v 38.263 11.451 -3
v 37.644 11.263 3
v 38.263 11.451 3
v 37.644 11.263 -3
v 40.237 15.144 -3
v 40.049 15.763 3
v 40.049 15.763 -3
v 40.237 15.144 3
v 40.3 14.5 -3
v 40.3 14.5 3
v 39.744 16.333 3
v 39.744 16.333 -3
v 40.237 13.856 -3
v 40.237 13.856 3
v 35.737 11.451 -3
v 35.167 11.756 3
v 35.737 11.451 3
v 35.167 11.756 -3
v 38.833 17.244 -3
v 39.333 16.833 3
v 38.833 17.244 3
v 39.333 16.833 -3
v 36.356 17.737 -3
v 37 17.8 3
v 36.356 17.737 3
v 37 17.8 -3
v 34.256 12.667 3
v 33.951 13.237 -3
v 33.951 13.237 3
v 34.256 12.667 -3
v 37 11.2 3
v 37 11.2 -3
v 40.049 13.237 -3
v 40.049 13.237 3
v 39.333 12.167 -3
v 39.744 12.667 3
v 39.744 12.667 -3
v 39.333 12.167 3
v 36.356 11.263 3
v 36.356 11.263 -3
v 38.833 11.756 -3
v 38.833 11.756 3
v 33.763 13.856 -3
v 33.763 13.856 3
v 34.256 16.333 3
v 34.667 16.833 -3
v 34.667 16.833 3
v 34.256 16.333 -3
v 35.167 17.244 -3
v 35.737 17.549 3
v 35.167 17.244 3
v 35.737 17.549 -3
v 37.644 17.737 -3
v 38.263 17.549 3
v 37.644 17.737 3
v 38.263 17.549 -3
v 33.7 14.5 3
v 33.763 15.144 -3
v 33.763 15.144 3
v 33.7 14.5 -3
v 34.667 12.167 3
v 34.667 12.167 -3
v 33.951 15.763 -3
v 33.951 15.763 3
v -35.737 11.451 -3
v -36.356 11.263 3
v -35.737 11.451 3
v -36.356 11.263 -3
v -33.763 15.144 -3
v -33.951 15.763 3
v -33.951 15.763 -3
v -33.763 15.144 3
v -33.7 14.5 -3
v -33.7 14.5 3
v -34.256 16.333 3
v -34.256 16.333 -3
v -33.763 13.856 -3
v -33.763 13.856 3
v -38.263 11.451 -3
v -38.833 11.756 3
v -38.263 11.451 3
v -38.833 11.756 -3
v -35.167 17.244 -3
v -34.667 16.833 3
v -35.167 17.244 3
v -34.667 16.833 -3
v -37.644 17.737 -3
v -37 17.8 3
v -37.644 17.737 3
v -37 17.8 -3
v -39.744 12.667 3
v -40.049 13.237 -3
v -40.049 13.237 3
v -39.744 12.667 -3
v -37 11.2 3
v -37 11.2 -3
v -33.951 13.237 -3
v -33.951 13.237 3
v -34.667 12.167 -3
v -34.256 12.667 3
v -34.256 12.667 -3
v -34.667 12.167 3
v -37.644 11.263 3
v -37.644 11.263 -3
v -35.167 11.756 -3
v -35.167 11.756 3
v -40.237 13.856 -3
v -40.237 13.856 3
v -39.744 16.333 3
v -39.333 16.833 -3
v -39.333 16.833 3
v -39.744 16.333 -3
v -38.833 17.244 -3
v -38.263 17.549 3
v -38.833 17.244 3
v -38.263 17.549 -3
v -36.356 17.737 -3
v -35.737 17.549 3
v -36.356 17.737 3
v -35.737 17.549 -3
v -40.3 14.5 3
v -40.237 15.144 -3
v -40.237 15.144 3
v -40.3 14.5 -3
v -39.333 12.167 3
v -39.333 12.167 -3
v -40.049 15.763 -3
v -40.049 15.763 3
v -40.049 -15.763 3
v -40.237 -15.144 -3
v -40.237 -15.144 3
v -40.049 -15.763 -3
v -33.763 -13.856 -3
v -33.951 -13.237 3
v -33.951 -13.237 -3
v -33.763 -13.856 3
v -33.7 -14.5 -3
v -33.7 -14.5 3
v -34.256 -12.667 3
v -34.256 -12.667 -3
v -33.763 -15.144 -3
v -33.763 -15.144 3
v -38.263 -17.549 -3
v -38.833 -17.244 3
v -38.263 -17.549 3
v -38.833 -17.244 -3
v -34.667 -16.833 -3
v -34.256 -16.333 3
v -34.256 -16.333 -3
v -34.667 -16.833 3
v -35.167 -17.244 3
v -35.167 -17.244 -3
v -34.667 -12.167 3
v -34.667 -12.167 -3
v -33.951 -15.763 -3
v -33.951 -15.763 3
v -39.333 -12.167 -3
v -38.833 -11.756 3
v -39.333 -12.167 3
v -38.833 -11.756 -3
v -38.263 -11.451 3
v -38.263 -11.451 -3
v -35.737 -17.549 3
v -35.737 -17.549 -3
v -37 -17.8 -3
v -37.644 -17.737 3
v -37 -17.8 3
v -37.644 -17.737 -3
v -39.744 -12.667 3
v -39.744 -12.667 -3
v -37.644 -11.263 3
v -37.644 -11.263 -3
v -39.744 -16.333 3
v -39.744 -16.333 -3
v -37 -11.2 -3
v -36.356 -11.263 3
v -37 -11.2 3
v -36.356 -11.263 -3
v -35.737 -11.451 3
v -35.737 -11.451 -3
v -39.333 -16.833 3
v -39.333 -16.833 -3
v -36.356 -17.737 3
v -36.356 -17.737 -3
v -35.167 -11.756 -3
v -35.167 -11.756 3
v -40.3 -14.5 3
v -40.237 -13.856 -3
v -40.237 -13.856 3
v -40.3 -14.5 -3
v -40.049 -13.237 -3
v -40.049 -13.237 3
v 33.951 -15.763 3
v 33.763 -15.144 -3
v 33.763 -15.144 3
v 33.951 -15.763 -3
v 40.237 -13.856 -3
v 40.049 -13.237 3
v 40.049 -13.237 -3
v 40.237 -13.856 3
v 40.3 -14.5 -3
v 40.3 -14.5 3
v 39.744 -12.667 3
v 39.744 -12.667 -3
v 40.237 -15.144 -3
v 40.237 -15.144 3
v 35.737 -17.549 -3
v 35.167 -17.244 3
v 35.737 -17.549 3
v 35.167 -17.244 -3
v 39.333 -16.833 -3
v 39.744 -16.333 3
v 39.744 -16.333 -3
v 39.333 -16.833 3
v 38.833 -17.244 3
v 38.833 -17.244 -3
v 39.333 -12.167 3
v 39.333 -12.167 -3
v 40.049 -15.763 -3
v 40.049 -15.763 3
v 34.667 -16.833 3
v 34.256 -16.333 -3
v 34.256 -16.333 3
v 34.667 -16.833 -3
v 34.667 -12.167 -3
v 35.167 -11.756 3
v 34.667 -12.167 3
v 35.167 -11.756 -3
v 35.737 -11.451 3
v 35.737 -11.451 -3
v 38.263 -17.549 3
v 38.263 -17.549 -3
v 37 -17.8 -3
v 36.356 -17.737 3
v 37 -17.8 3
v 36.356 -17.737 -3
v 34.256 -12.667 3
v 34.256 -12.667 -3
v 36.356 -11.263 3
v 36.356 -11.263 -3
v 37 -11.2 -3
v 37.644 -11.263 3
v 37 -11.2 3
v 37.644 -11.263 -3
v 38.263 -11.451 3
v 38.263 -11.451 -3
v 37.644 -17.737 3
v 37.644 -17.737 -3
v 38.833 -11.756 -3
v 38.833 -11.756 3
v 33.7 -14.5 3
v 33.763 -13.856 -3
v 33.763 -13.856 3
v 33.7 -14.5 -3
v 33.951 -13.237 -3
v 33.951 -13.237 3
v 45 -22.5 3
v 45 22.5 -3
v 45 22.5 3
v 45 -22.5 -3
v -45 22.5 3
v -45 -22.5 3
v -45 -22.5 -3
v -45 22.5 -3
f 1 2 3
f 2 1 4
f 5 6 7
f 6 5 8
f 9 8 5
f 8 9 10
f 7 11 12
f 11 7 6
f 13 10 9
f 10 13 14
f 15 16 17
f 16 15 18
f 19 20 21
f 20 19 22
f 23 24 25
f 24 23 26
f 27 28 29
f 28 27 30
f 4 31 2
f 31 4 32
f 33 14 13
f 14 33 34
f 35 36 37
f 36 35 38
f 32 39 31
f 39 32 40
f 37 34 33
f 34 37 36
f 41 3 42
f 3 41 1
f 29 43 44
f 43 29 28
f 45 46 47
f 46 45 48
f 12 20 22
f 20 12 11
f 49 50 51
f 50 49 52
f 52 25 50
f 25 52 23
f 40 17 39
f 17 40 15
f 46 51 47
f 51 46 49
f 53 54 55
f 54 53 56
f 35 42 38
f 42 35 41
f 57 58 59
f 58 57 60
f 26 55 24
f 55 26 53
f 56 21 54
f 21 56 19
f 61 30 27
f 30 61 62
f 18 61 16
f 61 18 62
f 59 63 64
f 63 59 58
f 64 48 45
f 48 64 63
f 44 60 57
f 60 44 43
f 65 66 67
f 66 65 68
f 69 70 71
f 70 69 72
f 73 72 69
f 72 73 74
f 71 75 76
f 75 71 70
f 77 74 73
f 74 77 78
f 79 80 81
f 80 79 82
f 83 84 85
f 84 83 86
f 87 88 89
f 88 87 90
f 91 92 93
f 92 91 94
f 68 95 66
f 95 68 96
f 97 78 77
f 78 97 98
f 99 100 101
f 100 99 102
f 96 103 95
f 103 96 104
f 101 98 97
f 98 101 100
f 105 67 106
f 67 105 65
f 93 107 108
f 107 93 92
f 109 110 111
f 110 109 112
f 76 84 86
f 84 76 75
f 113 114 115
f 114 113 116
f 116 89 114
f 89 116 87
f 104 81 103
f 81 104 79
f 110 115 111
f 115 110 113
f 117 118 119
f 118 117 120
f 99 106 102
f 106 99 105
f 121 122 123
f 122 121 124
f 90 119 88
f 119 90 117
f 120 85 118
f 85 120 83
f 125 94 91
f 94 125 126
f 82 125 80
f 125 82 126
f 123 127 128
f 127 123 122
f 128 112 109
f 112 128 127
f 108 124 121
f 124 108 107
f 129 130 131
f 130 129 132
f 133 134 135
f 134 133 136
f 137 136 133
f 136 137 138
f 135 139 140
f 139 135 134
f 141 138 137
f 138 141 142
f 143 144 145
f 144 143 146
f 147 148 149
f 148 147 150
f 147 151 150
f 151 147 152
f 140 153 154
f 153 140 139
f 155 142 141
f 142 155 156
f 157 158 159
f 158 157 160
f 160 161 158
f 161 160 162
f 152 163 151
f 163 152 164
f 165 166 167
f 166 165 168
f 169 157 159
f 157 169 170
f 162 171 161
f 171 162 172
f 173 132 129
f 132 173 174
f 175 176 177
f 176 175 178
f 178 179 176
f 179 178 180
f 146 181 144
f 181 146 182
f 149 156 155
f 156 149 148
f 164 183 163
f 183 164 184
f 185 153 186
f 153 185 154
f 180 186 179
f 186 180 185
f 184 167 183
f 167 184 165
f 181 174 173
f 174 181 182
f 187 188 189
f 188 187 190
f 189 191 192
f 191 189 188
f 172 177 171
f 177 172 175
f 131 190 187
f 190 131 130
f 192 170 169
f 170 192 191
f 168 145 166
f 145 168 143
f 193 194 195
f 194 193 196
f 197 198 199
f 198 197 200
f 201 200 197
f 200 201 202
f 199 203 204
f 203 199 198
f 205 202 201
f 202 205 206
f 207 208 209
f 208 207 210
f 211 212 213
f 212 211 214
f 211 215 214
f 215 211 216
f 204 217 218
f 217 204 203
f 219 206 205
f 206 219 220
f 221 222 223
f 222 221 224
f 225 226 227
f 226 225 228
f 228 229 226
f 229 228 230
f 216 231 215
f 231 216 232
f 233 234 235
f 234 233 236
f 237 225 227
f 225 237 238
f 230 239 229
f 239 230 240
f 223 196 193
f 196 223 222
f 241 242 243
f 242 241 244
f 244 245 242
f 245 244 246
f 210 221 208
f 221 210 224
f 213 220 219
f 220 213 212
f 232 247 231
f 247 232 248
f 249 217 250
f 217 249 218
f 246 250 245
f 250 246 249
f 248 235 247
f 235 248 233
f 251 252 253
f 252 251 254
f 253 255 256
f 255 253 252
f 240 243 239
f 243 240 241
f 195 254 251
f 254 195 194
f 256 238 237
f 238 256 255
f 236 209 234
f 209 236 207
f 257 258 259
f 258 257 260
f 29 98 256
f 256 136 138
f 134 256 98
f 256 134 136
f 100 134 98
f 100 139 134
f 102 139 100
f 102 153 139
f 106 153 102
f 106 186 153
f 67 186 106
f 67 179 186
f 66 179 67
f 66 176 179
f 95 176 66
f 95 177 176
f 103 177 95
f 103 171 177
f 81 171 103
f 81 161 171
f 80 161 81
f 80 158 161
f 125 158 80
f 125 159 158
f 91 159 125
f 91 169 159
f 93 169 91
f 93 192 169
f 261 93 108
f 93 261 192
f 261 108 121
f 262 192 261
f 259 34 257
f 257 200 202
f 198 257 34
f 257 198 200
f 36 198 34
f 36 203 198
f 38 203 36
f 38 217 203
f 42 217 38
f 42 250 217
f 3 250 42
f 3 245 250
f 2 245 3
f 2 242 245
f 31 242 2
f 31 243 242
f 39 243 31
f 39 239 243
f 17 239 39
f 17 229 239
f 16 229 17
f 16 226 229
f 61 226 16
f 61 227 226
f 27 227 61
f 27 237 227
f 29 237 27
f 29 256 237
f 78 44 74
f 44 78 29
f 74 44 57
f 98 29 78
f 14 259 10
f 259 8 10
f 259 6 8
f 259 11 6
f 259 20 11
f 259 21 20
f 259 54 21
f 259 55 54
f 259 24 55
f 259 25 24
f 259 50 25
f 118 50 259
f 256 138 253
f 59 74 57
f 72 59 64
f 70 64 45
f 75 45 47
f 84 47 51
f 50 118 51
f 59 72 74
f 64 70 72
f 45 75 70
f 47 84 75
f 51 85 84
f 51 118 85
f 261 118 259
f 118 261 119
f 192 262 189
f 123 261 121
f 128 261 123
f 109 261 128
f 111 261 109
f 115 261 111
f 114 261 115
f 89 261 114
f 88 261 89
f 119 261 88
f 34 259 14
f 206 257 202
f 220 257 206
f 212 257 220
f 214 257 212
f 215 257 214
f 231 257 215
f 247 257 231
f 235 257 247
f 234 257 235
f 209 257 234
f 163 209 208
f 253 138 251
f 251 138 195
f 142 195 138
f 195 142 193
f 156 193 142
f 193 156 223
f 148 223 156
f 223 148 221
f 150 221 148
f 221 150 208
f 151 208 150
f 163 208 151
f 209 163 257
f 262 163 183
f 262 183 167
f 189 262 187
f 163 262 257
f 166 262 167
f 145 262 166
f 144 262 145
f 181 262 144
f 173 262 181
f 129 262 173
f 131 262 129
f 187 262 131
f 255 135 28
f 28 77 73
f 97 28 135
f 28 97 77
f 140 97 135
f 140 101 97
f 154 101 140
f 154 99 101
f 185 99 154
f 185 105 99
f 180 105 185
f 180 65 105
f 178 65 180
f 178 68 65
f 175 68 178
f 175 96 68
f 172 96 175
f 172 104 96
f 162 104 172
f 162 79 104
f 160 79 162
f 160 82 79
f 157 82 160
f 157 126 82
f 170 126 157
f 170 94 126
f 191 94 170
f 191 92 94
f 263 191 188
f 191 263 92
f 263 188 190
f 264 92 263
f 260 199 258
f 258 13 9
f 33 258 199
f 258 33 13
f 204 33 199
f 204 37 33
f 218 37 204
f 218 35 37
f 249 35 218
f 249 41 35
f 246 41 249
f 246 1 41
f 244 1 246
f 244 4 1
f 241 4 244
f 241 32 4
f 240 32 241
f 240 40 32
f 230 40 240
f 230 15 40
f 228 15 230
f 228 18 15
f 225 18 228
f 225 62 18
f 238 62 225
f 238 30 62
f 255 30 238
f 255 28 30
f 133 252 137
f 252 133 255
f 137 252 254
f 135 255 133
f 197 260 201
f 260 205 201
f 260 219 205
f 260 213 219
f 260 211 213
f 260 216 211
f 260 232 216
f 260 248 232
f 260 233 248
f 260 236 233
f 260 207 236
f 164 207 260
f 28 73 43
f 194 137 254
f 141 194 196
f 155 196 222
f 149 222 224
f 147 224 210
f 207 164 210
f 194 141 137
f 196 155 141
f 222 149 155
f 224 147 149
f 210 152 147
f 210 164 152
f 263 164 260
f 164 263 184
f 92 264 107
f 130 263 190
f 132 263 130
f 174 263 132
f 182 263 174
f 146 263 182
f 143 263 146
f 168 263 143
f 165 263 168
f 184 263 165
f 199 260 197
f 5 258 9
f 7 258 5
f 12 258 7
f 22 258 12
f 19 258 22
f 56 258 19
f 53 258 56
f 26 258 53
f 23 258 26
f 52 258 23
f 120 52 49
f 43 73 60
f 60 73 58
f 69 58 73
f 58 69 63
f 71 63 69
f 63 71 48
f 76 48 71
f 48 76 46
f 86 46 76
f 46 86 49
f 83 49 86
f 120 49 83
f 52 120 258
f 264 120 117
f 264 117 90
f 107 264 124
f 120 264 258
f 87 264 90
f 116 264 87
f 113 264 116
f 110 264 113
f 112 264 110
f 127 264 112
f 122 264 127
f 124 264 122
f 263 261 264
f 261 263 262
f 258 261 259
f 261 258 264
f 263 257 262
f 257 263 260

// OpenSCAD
$fn = 32;

// ----------------------------------------------------------------------
// Corner plate 90 x 45 x 6
// 4 holes, centres taken from the edge offset
// ----------------------------------------------------------------------

// --- parameters (mm) ---
plate = [90, 45, 6];  // overall size (x, y, z)
holes = 4;            // number of holes the drawing asks for
hole_d = 6.6;         // hole diameter
edge = 8;             // hole centre offset from the plate edge

// --- derived feature positions (mm) ---
corner_x = plate[0] / 2 - edge;  // = 37   corner hole X
corner_y = plate[1] / 2 - edge;  // = 14.5   corner hole Y
feature_centers = [
  [corner_x, corner_y],
  [-corner_x, corner_y],
  [-corner_x, -corner_y],
  [corner_x, -corner_y]
];   // hole centres the loop below drills

// plate outline, every hole drilled through with the same cutters
difference() {
  cube(plate, center = true);
  for (centre = feature_centers)
    translate([centre[0], centre[1], 0])
      cylinder(d = hole_d, h = plate[2] + 2, center = true);
}
